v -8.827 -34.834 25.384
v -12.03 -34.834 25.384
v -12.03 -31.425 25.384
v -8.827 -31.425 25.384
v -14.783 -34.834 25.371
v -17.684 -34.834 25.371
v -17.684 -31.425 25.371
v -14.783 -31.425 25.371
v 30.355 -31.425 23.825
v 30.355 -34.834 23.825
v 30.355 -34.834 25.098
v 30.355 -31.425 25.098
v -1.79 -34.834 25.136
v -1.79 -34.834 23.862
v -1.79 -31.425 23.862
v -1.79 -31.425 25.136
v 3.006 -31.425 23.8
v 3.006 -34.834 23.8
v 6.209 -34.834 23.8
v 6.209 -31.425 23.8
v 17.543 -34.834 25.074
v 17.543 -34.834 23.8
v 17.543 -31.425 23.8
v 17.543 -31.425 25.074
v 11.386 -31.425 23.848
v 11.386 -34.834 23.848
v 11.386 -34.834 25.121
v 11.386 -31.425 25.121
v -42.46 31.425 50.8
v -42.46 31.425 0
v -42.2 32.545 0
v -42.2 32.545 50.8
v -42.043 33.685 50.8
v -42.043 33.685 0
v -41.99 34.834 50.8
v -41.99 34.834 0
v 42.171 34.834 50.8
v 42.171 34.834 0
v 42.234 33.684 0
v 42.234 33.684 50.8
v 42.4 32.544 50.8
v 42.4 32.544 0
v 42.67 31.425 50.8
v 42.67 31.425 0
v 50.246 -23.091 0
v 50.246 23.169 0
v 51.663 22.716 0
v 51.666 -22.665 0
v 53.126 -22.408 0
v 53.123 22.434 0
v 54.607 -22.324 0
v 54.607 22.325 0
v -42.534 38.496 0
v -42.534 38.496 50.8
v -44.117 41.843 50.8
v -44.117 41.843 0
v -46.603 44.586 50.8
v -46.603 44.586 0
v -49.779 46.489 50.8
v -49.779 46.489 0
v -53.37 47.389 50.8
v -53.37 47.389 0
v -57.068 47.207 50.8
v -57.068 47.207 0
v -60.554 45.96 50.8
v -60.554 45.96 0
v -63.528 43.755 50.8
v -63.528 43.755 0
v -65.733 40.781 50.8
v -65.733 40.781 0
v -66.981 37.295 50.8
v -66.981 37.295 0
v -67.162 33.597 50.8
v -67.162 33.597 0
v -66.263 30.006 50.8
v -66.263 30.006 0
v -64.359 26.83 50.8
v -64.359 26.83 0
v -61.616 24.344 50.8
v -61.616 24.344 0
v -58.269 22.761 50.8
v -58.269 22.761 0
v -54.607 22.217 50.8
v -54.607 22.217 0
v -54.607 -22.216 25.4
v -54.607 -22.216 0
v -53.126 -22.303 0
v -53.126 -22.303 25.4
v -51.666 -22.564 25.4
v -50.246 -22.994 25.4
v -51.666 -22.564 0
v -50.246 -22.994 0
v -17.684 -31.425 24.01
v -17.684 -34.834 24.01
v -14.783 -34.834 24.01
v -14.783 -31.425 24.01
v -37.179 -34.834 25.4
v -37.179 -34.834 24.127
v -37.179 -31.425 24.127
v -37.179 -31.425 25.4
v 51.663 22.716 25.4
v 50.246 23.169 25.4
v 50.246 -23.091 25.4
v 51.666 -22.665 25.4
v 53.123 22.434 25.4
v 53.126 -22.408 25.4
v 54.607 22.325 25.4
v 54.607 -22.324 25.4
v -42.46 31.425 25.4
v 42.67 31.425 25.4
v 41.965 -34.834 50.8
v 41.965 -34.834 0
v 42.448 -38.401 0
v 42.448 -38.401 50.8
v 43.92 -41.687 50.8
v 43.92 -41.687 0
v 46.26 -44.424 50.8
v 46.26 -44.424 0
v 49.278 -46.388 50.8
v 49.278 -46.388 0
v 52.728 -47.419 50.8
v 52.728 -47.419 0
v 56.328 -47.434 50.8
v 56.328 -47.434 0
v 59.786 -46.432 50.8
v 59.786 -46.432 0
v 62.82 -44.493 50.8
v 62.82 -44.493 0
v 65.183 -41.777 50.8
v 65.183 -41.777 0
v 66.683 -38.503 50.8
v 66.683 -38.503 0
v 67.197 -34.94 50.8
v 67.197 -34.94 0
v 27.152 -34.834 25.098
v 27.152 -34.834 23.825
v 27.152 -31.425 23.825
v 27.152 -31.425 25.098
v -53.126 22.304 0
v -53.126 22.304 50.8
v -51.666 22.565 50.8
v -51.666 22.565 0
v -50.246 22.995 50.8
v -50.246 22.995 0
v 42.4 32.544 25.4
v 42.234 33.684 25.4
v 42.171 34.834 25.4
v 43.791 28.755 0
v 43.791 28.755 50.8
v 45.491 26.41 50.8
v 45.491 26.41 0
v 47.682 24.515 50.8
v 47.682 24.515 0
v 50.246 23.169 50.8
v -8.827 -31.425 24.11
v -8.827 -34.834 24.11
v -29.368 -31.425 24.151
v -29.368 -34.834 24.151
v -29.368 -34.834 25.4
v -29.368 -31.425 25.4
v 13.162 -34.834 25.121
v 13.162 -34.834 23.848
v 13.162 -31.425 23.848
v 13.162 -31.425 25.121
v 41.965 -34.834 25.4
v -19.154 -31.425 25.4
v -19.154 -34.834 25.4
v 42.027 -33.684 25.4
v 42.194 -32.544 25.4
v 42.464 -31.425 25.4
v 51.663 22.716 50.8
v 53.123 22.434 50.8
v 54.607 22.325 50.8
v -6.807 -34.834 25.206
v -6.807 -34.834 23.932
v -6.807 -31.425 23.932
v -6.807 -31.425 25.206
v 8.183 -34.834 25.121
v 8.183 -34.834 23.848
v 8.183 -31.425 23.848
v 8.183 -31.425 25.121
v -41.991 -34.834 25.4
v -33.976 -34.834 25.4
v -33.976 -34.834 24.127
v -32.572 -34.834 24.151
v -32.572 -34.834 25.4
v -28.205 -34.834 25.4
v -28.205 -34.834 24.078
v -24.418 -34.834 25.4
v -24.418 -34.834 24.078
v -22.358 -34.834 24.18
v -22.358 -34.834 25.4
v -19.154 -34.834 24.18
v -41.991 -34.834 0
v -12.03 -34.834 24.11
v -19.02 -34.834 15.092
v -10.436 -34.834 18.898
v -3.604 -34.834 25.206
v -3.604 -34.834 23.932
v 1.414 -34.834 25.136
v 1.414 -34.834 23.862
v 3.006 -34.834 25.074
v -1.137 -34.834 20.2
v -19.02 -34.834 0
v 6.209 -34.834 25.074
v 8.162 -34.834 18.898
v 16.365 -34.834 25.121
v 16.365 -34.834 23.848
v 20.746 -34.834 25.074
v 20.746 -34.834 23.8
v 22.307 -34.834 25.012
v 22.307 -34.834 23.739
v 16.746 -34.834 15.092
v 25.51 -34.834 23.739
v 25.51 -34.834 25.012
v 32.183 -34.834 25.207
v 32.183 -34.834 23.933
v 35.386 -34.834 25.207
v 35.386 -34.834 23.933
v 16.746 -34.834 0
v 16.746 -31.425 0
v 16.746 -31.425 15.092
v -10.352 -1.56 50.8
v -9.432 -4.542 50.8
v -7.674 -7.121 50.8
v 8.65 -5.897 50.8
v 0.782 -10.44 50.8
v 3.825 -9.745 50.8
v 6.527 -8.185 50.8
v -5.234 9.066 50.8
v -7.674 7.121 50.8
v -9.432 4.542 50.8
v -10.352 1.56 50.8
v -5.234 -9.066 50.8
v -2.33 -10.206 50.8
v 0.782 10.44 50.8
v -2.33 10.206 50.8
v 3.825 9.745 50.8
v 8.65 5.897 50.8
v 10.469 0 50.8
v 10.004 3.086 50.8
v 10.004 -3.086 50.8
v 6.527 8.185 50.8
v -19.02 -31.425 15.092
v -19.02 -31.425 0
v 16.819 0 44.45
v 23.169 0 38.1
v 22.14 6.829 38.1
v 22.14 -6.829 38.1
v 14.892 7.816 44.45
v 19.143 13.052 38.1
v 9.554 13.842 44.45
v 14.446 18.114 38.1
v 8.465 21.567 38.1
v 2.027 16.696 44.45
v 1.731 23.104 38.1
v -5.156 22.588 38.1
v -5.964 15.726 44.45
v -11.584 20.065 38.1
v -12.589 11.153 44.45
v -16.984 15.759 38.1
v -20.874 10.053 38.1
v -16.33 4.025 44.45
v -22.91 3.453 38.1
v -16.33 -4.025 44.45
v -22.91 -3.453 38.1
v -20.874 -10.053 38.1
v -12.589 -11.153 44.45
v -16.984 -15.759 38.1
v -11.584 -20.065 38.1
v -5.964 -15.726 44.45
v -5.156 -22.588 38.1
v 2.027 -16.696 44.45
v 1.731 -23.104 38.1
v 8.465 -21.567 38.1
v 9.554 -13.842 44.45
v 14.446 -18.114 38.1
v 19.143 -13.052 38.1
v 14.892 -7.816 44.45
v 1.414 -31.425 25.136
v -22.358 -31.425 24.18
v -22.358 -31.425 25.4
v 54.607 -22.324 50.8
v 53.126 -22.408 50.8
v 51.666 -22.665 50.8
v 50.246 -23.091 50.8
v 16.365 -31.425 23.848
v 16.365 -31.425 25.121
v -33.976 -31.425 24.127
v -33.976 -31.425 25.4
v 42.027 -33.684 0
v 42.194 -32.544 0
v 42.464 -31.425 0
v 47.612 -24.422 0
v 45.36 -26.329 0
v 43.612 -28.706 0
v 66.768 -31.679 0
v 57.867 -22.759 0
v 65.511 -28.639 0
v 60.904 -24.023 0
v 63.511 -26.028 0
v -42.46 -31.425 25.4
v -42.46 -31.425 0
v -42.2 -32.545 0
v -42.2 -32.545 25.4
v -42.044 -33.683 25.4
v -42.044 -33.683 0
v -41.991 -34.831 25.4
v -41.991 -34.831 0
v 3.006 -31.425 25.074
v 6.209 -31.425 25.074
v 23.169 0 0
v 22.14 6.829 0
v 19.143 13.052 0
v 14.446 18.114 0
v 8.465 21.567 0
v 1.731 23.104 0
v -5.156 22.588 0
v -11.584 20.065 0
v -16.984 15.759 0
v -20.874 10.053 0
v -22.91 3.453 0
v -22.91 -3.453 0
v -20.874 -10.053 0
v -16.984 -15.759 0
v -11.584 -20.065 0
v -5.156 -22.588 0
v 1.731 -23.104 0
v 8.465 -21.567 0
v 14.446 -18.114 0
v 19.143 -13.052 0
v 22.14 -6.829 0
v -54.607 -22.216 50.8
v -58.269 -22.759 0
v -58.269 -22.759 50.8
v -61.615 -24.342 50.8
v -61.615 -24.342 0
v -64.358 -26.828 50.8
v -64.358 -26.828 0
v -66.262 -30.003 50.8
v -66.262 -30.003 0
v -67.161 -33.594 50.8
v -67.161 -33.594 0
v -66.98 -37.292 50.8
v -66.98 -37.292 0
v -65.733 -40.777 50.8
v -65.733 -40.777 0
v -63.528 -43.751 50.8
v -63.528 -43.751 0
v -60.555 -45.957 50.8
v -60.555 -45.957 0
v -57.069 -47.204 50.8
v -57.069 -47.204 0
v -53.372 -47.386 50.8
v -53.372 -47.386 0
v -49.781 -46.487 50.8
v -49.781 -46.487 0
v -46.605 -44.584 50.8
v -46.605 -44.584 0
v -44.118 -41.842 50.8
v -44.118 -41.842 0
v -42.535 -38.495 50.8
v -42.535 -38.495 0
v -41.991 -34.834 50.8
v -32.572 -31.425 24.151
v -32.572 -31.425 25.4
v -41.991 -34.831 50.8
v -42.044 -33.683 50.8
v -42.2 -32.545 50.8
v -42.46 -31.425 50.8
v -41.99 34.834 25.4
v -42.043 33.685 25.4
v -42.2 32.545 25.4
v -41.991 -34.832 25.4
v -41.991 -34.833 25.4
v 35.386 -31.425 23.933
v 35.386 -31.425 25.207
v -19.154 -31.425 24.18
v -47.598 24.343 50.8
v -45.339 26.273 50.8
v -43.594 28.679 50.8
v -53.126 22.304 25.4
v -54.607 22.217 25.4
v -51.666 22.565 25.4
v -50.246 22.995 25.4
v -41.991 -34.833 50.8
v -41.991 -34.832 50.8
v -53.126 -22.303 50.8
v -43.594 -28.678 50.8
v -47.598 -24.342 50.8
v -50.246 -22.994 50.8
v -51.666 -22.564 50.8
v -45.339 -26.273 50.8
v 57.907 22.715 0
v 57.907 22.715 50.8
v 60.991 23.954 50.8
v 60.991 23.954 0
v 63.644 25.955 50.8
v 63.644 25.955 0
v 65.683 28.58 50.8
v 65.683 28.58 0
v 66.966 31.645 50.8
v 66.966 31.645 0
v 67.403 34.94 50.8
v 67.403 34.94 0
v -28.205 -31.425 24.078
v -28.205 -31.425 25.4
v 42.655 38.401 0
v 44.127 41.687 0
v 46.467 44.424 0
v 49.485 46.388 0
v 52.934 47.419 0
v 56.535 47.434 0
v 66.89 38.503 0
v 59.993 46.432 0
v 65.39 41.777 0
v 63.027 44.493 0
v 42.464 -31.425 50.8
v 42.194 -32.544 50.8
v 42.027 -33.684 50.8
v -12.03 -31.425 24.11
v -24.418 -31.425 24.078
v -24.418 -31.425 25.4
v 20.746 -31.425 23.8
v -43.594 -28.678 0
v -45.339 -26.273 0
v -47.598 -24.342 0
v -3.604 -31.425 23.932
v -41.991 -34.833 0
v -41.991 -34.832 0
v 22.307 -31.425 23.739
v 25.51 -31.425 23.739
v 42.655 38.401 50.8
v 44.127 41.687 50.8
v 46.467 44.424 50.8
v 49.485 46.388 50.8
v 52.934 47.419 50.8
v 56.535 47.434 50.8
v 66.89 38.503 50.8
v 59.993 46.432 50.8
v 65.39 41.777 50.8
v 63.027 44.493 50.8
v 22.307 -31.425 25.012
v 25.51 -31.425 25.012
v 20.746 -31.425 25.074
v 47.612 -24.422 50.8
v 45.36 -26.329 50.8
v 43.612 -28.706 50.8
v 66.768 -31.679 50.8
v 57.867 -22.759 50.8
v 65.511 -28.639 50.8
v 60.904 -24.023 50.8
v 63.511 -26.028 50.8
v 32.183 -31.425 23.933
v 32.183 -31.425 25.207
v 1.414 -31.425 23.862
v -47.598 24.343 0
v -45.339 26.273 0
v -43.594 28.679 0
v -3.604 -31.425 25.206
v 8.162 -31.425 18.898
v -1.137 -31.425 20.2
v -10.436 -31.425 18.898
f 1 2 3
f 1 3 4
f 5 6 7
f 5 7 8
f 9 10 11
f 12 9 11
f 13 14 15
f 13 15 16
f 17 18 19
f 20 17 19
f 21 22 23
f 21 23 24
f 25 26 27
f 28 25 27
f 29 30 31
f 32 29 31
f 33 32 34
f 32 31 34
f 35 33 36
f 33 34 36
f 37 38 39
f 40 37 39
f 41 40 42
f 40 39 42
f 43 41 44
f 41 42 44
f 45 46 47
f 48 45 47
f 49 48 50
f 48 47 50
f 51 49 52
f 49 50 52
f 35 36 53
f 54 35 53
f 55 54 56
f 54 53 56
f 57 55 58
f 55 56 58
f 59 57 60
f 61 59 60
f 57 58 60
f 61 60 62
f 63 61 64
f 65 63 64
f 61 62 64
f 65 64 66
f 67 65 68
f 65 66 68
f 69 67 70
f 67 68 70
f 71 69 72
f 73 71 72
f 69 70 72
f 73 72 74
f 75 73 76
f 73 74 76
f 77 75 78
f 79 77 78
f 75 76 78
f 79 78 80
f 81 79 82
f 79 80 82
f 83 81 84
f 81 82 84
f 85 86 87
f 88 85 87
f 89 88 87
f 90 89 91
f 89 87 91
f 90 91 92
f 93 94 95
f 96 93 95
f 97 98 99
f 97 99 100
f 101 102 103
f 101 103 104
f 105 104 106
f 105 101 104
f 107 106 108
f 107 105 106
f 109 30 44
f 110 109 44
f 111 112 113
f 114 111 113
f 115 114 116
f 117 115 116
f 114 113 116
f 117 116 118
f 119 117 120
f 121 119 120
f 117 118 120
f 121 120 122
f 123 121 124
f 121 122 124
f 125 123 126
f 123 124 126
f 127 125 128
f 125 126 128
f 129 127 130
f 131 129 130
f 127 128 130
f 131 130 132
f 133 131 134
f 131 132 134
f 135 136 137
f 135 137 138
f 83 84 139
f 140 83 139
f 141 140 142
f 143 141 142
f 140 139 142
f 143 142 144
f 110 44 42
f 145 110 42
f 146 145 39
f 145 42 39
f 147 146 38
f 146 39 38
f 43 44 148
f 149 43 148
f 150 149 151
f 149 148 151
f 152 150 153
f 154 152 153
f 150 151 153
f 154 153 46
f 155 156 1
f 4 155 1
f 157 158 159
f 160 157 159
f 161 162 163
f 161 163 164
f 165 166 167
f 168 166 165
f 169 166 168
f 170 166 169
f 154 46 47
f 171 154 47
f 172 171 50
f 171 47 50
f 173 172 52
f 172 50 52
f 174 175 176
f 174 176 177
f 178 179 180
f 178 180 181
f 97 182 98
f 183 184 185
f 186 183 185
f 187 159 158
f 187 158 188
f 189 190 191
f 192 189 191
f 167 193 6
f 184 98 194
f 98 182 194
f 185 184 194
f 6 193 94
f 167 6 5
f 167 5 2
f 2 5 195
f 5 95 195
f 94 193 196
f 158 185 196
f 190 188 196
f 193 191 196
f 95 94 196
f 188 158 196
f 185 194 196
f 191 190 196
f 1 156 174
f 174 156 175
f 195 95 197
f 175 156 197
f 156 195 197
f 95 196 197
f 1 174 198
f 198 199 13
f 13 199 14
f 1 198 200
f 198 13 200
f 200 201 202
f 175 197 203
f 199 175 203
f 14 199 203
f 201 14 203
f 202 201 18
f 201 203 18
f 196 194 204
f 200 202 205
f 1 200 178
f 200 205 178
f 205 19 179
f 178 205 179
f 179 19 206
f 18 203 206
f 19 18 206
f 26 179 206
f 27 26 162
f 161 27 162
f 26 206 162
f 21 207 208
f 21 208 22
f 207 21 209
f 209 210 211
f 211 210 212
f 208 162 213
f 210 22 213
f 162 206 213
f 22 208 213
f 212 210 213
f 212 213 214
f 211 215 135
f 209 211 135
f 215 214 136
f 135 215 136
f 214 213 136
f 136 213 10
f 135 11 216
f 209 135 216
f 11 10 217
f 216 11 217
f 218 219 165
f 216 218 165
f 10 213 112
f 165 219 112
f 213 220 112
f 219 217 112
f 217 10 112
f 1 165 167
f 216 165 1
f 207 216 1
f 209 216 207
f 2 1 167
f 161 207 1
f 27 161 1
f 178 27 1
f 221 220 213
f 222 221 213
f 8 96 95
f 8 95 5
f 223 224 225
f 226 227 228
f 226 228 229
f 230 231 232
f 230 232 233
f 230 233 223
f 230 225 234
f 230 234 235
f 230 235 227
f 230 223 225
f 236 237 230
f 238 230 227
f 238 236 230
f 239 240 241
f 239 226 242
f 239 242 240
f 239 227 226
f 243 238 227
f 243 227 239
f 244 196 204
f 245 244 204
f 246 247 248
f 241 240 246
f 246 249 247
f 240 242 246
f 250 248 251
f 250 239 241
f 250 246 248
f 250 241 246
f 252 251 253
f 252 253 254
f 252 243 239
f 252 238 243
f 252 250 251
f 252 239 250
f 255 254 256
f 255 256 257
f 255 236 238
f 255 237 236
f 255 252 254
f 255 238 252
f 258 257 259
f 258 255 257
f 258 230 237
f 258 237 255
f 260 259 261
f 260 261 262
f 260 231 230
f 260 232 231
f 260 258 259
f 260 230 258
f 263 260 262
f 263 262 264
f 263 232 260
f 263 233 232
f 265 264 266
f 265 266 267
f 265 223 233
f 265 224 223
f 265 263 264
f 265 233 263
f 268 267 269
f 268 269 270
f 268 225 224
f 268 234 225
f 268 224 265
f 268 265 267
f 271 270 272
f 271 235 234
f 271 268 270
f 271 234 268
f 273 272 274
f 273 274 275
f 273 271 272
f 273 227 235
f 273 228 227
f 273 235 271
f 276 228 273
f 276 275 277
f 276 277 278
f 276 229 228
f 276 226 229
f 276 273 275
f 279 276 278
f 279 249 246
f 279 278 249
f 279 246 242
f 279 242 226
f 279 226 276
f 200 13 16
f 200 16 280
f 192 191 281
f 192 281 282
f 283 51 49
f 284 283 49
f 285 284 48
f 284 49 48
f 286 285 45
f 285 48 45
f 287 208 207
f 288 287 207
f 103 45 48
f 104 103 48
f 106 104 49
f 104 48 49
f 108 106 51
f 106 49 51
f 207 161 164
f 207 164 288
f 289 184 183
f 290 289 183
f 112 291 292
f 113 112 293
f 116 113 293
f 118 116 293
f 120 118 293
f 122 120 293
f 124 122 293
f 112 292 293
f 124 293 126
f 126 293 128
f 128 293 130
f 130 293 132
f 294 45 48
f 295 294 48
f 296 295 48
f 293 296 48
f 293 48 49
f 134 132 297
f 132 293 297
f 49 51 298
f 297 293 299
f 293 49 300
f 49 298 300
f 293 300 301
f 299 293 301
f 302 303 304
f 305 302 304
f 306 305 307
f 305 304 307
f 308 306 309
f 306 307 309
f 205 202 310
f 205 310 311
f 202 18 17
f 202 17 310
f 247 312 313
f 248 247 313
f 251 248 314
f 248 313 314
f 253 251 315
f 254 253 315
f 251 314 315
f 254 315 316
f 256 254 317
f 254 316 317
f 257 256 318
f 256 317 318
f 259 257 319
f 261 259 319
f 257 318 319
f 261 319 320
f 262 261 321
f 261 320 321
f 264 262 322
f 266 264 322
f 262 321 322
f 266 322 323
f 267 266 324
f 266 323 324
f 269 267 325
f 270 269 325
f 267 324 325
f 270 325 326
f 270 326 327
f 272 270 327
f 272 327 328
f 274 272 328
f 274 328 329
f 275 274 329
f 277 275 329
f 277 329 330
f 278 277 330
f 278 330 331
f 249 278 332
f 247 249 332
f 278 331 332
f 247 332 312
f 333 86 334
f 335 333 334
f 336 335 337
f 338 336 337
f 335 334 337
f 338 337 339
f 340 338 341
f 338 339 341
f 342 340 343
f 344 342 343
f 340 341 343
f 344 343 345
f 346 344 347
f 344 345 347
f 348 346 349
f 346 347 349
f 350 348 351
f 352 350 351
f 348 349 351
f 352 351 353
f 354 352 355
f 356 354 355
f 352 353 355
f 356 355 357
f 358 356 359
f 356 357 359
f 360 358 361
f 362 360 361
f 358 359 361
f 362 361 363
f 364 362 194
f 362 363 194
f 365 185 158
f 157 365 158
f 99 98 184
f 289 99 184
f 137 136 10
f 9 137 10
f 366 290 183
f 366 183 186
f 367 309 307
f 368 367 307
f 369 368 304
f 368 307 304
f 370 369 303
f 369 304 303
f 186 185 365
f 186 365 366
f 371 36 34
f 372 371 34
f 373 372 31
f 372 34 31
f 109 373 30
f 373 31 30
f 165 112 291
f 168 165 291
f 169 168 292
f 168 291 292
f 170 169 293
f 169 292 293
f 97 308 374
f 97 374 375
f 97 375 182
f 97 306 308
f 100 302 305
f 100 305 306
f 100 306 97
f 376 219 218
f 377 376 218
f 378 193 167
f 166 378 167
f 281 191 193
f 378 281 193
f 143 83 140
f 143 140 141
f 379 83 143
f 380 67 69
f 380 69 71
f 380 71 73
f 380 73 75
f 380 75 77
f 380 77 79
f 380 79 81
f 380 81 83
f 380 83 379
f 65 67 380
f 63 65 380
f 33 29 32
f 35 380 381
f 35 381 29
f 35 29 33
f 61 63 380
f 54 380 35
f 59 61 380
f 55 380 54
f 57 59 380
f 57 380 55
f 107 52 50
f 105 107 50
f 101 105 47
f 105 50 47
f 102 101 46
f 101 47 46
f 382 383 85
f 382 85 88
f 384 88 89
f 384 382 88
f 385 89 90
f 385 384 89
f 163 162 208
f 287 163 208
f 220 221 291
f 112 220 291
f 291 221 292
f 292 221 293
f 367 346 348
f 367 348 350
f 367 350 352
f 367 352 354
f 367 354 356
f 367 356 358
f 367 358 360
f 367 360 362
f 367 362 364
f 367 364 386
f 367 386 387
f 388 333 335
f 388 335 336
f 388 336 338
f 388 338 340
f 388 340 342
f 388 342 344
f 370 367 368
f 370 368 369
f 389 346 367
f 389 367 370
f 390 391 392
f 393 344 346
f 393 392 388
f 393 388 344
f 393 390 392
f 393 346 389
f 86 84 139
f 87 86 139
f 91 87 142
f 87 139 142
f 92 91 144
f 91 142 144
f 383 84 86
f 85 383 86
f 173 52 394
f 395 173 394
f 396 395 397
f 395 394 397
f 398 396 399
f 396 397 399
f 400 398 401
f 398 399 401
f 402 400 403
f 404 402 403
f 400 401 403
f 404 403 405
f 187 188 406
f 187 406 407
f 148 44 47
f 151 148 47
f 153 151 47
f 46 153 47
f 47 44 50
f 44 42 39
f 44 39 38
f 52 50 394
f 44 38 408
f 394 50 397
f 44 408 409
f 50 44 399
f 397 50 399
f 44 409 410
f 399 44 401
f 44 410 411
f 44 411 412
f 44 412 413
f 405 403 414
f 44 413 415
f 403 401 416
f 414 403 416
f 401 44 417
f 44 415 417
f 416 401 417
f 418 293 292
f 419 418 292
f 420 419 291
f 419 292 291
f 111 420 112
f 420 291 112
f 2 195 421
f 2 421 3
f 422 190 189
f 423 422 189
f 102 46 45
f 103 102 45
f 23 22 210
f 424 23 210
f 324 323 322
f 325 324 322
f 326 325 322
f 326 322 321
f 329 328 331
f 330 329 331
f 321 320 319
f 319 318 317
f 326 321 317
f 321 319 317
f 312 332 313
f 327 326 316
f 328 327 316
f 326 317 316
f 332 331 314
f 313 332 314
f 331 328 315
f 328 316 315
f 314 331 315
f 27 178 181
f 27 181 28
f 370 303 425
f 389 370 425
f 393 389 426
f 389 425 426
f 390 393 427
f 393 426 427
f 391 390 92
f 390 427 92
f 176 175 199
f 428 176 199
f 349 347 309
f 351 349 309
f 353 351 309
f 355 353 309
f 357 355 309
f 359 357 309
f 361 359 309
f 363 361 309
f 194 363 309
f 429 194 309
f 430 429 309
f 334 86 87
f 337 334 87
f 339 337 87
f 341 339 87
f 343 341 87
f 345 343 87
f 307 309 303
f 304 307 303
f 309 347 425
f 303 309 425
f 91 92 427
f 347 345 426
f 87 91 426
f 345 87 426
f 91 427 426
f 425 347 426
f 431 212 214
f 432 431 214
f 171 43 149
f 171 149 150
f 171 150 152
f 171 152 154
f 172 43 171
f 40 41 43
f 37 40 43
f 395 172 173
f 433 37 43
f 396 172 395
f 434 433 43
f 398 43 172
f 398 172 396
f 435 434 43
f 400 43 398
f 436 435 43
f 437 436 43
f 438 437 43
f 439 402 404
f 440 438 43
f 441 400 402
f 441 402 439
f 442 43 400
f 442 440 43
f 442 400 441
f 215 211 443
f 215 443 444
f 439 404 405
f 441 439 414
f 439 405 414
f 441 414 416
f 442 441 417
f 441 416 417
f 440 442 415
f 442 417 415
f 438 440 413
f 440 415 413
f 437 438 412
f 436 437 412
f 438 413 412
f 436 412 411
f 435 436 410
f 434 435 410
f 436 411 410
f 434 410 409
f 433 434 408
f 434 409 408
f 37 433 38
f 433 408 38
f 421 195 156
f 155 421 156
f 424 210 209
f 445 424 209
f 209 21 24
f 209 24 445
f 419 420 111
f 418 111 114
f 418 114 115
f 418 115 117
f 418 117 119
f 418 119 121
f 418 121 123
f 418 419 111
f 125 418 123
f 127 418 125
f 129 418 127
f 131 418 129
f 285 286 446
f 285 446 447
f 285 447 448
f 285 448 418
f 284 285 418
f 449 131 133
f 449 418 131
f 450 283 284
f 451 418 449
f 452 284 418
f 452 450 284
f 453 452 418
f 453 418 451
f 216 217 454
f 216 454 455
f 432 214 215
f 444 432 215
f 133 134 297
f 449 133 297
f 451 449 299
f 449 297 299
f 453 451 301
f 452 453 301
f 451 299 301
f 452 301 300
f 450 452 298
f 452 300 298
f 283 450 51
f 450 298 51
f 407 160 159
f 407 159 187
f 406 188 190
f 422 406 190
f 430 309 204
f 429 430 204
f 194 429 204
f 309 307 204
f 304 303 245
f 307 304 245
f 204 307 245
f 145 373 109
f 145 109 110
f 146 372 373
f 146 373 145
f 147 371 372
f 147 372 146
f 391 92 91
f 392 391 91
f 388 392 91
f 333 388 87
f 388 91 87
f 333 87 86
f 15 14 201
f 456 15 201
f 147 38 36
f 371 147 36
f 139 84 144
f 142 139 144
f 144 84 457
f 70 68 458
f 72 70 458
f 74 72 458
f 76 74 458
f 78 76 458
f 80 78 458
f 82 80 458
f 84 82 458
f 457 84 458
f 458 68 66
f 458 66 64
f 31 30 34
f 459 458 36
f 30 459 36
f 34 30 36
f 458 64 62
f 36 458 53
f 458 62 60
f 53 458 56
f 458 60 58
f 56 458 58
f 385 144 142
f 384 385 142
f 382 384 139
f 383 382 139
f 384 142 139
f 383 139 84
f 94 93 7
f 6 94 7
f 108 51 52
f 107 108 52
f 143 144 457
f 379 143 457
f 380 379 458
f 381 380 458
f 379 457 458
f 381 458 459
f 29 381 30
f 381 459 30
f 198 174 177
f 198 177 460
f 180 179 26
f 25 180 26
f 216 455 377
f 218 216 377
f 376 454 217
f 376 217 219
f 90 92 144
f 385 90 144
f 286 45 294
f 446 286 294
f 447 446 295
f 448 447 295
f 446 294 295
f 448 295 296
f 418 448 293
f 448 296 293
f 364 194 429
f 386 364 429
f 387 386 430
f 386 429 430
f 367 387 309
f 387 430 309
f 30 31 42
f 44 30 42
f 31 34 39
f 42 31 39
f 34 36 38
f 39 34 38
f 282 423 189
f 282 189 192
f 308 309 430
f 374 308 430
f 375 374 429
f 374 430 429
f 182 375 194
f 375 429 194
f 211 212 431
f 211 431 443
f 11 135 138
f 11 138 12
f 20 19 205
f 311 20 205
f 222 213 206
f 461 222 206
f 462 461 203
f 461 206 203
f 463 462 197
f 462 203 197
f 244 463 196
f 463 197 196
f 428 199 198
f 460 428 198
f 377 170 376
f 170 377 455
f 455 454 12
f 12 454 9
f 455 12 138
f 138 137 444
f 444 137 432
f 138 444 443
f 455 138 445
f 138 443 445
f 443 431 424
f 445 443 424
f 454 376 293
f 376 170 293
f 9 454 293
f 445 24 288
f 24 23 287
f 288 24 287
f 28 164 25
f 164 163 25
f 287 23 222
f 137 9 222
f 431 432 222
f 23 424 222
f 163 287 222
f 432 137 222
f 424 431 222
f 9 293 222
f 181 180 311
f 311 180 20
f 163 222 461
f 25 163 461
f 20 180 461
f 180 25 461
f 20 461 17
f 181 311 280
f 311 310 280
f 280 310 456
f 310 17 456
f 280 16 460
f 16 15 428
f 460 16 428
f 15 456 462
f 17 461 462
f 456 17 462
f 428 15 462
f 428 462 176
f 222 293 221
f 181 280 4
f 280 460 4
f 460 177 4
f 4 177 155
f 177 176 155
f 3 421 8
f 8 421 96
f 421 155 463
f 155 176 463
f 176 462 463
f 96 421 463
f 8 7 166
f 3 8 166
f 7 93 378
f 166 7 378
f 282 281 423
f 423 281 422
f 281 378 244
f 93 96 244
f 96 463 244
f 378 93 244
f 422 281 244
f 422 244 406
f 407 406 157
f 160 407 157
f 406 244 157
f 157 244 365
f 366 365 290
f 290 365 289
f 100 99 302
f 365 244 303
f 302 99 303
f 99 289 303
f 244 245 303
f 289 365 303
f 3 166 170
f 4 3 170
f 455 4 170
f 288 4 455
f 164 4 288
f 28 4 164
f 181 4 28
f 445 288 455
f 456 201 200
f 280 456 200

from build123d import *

# Parameters (mm, degrees)
F1_DEPTH   = 25.4
F2_DEPTH   = 50.8
F0_R       = 23.1689364428
F4_DEPTH   = 14.986
F5_W       = 3.2030940056
F5_H       = 1.273414427
F5_H_2     = 1.2491918117
F5_W_2     = 3.7871245295
F5_H_3     = 1.3221087813
F5_H_4     = 1.2197750568
F5_W_3     = 2.9007913545
F5_H_5     = 1.361253047
F1_FACE1_W = 85.1300132265
F1_FACE1_H = 25.4
F1_FACE2_W = 84.1618746061
F1_FACE2_H = 25.4
F6_DEPTH   = 7.112
F7_SIZE    = 12.7


with BuildPart() as f1:
    # F0 (on Top) → F1 (new body)
    with BuildSketch(Plane.XY):
        with BuildLine():
            Line((42.1713891774, 34.8335728049), (-41.9904854287, 34.8335728049))
            ThreePointArc((-41.9904854287, 34.8335728049), (-42.1083213465, 33.1132780775), (-42.4596279258, 31.4251184464))
            Line((-42.4596279258, 31.4251184464), (42.6703853007, 31.4251184464))
            ThreePointArc((42.6703853007, 31.4251184464), (42.3040081413, 33.1122345804), (42.1713891774, 34.8335728049))
        make_face()
    extrude(amount=F1_DEPTH)


with BuildPart() as f1b:
    # F0 (on Top) → F1, piece 2 (new body)
    with BuildSketch(Plane.XY):
        with BuildLine():
            Line((-54.6067543328, 22.2173039008), (-54.6067543328, -22.2160224009))
            ThreePointArc((-54.6067543328, -22.2160224009), (-52.3921133094, -22.4119345582), (-50.2462573349, -22.9935861489))
            Line((-50.2462573349, -22.9935861489), (-50.2462573349, 22.9948099053))
            ThreePointArc((-50.2462573349, 22.9948099053), (-52.3921183776, 22.4132012868), (-54.6067543328, 22.2173039008))
        make_face()
    extrude(amount=F1_DEPTH)


with BuildPart() as f1c:
    # F0 (on Top) → F1, piece 3 (new body)
    with BuildSketch(Plane.XY):
        with BuildLine():
            Line((-41.9913647822, -34.8335728049), (41.9646467417, -34.8335728049))
            ThreePointArc((41.9646467417, -34.8335728049), (42.0972657056, -33.1122345804), (42.463642865, -31.4251184464))
            Line((42.463642865, -31.4251184464), (-42.4599349352, -31.4251184464))
            ThreePointArc((-42.4599349352, -31.4251184464), (-42.1090561661, -33.112226656), (-41.9913645972, -34.8314121366))
            ThreePointArc((-41.9913645972, -34.8314121366), (-41.9913646434, -34.8324924707), (-41.9913647822, -34.8335728049))
        make_face()
    extrude(amount=F1_DEPTH)

    # F3 (on face) → F4 (cut)
    with BuildSketch(Plane.XZ.offset(34.8335728049)):
        with BuildLine():
            Line((-19.0204642713, 15.0923253968), (-19.0204642713, 0))
            Line((-19.0204642713, 0), (16.7462807149, 0))
            Line((16.7462807149, 0), (16.7462807149, 15.0923253968))
            ThreePointArc((16.7462807149, 15.0923253968), (-1.1370917782, 20.2000644219), (-19.0204642713, 15.0923253968))
        make_face()
    extrude(amount=-F4_DEPTH, mode=Mode.SUBTRACT)

    # F5 (on face) + F1_face1 (on face) + F1_face2 (on face) → F6 (cut)
    with BuildSketch(Plane.XZ.offset(34.8335728049)):
        with Locations((-35.5779528618, 24.7632927865)):
            Rectangle(F5_W, F5_H)
        with Locations((-30.9700351208, 24.7754040942)):
            Rectangle(F5_W, F5_H_2)
        with Locations((-26.3112029061, 24.7389456093)):
            Rectangle(F5_W_2, F5_H_3)
        with Locations((-20.7560434937, 24.7901124716)):
            Rectangle(F5_W, F5_H_4)
        with Locations((-16.2332779728, 24.6905572712)):
            Rectangle(F5_W_3, F5_H_5)
        with Locations((-10.4287816212, 24.747133255)):
            Rectangle(F5_W, F5_H)
        with Locations((-5.2050889935, 24.5689451694)):
            Rectangle(F5_W, F5_H)
        with Locations((-0.1880034979, 24.4990028441)):
            Rectangle(F5_W, F5_H)
        with Locations((4.6075105201, 24.4370289147)):
            Rectangle(F5_W, F5_H)
        with Locations((9.7847376019, 24.4842600077)):
            Rectangle(F5_W, F5_H)
        with Locations((14.7634353489, 24.4842600077)):
            Rectangle(F5_W, F5_H)
        with Locations((19.1444754601, 24.4370233268)):
            Rectangle(F5_W, F5_H)
        with Locations((23.9080954343, 24.3755578995)):
            Rectangle(F5_W, F5_H)
        with Locations((28.7535134703, 24.4615059346)):
            Rectangle(F5_W, F5_H)
        with Locations((33.7848700583, 24.5699640363)):
            Rectangle(F5_W, F5_H)
    with BuildSketch(Plane(origin=(0.1053786874, 31.4251184464, 12.7), x_dir=(1, 0, 0), z_dir=(0, -1, 0))):
        Rectangle(F1_FACE1_W, F1_FACE1_H)
    with BuildSketch(Plane(origin=(0.0904518744, 34.8335728049, 12.7), x_dir=(-1, 0, 0), z_dir=(0, 1, 0))):
        Rectangle(F1_FACE2_W, F1_FACE2_H)
    extrude(amount=-F6_DEPTH, dir=(0, -1, 0), mode=Mode.SUBTRACT)


with BuildPart() as f1d:
    # F0 (on Top) → F1, piece 4 (new body)
    with BuildSketch(Plane.XY):
        with BuildLine():
            Line((50.2462573349, 23.1690441136), (50.2462573349, -23.0913582413))
            ThreePointArc((50.2462573349, -23.0913582413), (52.3925594701, -22.5146622382), (54.6067543328, -22.3235281341))
            Line((54.6067543328, -22.3235281341), (54.6067543328, 22.3247913991))
            ThreePointArc((54.6067543328, 22.3247913991), (52.3890618107, 22.553522405), (50.2462573349, 23.1690441136))
        make_face()
    extrude(amount=F1_DEPTH)


with BuildPart() as f2:
    # F0 (on Top) → F2 (new body)
    with BuildSketch(Plane.XY):
        with BuildLine():
            ThreePointArc((-41.9904854287, 34.8335728049), (-63.5278036282, 43.7546221003), (-54.6067543328, 22.2173039008))
            ThreePointArc((-54.6067543328, 22.2173039008), (-52.3921183776, 22.4132012868), (-50.2462573349, 22.9948099053))
            ThreePointArc((-50.2462573349, 22.9948099053), (-45.3389102932, 26.2733562237), (-42.4596279258, 31.4251184464))
            ThreePointArc((-42.4596279258, 31.4251184464), (-42.1083213465, 33.1132780775), (-41.9904854287, 34.8335728049))
        make_face()
    extrude(amount=F2_DEPTH)


with BuildPart() as f2b:
    # F0 (on Top) → F2, piece 2 (new body)
    with BuildSketch(Plane.XY):
        with BuildLine():
            ThreePointArc((42.6703853007, 31.4251184464), (45.4914542286, 26.4098725356), (50.2462573349, 23.1690441136))
            ThreePointArc((50.2462573349, 23.1690441136), (52.3890618107, 22.553522405), (54.6067543328, 22.3247913991))
            ThreePointArc((54.6067543328, 22.3247913991), (63.6442295153, 25.9551457787), (67.4034800242, 34.9397696555))
            ThreePointArc((67.4034800242, 34.9397696555), (54.7341122246, 47.5559268187), (42.1713891774, 34.8335728049))
            ThreePointArc((42.1713891774, 34.8335728049), (42.3040081413, 33.1122345804), (42.6703853007, 31.4251184464))
        make_face()
    extrude(amount=F2_DEPTH)


with BuildPart() as f2c:
    # F0 (on Top) → F2, piece 3 (new body)
    with BuildSketch(Plane.XY):
        with BuildLine():
            ThreePointArc((42.463642865, -31.4251184464), (42.0972657056, -33.1122345804), (41.9646467417, -34.8335728049))
            ThreePointArc((41.9646467417, -34.8335728049), (54.5273697889, -47.5559268187), (67.1967375885, -34.9397696555))
            ThreePointArc((67.1967375885, -34.9397696555), (63.5108065243, -26.0280185859), (54.6067543328, -22.3235281341))
            ThreePointArc((54.6067543328, -22.3235281341), (52.3925594701, -22.5146622382), (50.2462573349, -23.0913582413))
            ThreePointArc((50.2462573349, -23.0913582413), (45.3597287048, -26.3288350204), (42.463642865, -31.4251184464))
        make_face()
    extrude(amount=F2_DEPTH)


with BuildPart() as f2d:
    # F0 (on Top) → F2, piece 4 (new body)
    with BuildSketch(Plane.XY):
        with BuildLine():
            ThreePointArc((-54.6067543328, -22.2160224009), (-63.5279458411, -43.7510758216), (-41.9913647822, -34.8335728049))
            ThreePointArc((-41.9913647822, -34.8335728049), (-41.9913646434, -34.8324924707), (-41.9913645972, -34.8314121366))
            ThreePointArc((-41.9913645972, -34.8314121366), (-42.1090561661, -33.112226656), (-42.4599349352, -31.4251184464))
            ThreePointArc((-42.4599349352, -31.4251184464), (-45.3387686905, -26.2726446835), (-50.2462573349, -22.9935861489))
            ThreePointArc((-50.2462573349, -22.9935861489), (-52.3921133094, -22.4119345582), (-54.6067543328, -22.2160224009))
        make_face()
    extrude(amount=F2_DEPTH)


with BuildPart() as f2e:
    # F0 (on Top) → F2, piece 5 (new body)
    with BuildSketch(Plane.XY):
        Circle(F0_R)
    extrude(amount=F2_DEPTH)

    # F7
    f7_edges = [f2e.edges().sort_by_distance(p)[0] for p in [
        (-23.168936, 0, 50.8),
    ]]
    chamfer(f7_edges, length=F7_SIZE)


solid = Compound([f1.part, f1b.part, f1c.part, f1d.part, f2.part, f2b.part, f2c.part, f2d.part, f2e.part])
